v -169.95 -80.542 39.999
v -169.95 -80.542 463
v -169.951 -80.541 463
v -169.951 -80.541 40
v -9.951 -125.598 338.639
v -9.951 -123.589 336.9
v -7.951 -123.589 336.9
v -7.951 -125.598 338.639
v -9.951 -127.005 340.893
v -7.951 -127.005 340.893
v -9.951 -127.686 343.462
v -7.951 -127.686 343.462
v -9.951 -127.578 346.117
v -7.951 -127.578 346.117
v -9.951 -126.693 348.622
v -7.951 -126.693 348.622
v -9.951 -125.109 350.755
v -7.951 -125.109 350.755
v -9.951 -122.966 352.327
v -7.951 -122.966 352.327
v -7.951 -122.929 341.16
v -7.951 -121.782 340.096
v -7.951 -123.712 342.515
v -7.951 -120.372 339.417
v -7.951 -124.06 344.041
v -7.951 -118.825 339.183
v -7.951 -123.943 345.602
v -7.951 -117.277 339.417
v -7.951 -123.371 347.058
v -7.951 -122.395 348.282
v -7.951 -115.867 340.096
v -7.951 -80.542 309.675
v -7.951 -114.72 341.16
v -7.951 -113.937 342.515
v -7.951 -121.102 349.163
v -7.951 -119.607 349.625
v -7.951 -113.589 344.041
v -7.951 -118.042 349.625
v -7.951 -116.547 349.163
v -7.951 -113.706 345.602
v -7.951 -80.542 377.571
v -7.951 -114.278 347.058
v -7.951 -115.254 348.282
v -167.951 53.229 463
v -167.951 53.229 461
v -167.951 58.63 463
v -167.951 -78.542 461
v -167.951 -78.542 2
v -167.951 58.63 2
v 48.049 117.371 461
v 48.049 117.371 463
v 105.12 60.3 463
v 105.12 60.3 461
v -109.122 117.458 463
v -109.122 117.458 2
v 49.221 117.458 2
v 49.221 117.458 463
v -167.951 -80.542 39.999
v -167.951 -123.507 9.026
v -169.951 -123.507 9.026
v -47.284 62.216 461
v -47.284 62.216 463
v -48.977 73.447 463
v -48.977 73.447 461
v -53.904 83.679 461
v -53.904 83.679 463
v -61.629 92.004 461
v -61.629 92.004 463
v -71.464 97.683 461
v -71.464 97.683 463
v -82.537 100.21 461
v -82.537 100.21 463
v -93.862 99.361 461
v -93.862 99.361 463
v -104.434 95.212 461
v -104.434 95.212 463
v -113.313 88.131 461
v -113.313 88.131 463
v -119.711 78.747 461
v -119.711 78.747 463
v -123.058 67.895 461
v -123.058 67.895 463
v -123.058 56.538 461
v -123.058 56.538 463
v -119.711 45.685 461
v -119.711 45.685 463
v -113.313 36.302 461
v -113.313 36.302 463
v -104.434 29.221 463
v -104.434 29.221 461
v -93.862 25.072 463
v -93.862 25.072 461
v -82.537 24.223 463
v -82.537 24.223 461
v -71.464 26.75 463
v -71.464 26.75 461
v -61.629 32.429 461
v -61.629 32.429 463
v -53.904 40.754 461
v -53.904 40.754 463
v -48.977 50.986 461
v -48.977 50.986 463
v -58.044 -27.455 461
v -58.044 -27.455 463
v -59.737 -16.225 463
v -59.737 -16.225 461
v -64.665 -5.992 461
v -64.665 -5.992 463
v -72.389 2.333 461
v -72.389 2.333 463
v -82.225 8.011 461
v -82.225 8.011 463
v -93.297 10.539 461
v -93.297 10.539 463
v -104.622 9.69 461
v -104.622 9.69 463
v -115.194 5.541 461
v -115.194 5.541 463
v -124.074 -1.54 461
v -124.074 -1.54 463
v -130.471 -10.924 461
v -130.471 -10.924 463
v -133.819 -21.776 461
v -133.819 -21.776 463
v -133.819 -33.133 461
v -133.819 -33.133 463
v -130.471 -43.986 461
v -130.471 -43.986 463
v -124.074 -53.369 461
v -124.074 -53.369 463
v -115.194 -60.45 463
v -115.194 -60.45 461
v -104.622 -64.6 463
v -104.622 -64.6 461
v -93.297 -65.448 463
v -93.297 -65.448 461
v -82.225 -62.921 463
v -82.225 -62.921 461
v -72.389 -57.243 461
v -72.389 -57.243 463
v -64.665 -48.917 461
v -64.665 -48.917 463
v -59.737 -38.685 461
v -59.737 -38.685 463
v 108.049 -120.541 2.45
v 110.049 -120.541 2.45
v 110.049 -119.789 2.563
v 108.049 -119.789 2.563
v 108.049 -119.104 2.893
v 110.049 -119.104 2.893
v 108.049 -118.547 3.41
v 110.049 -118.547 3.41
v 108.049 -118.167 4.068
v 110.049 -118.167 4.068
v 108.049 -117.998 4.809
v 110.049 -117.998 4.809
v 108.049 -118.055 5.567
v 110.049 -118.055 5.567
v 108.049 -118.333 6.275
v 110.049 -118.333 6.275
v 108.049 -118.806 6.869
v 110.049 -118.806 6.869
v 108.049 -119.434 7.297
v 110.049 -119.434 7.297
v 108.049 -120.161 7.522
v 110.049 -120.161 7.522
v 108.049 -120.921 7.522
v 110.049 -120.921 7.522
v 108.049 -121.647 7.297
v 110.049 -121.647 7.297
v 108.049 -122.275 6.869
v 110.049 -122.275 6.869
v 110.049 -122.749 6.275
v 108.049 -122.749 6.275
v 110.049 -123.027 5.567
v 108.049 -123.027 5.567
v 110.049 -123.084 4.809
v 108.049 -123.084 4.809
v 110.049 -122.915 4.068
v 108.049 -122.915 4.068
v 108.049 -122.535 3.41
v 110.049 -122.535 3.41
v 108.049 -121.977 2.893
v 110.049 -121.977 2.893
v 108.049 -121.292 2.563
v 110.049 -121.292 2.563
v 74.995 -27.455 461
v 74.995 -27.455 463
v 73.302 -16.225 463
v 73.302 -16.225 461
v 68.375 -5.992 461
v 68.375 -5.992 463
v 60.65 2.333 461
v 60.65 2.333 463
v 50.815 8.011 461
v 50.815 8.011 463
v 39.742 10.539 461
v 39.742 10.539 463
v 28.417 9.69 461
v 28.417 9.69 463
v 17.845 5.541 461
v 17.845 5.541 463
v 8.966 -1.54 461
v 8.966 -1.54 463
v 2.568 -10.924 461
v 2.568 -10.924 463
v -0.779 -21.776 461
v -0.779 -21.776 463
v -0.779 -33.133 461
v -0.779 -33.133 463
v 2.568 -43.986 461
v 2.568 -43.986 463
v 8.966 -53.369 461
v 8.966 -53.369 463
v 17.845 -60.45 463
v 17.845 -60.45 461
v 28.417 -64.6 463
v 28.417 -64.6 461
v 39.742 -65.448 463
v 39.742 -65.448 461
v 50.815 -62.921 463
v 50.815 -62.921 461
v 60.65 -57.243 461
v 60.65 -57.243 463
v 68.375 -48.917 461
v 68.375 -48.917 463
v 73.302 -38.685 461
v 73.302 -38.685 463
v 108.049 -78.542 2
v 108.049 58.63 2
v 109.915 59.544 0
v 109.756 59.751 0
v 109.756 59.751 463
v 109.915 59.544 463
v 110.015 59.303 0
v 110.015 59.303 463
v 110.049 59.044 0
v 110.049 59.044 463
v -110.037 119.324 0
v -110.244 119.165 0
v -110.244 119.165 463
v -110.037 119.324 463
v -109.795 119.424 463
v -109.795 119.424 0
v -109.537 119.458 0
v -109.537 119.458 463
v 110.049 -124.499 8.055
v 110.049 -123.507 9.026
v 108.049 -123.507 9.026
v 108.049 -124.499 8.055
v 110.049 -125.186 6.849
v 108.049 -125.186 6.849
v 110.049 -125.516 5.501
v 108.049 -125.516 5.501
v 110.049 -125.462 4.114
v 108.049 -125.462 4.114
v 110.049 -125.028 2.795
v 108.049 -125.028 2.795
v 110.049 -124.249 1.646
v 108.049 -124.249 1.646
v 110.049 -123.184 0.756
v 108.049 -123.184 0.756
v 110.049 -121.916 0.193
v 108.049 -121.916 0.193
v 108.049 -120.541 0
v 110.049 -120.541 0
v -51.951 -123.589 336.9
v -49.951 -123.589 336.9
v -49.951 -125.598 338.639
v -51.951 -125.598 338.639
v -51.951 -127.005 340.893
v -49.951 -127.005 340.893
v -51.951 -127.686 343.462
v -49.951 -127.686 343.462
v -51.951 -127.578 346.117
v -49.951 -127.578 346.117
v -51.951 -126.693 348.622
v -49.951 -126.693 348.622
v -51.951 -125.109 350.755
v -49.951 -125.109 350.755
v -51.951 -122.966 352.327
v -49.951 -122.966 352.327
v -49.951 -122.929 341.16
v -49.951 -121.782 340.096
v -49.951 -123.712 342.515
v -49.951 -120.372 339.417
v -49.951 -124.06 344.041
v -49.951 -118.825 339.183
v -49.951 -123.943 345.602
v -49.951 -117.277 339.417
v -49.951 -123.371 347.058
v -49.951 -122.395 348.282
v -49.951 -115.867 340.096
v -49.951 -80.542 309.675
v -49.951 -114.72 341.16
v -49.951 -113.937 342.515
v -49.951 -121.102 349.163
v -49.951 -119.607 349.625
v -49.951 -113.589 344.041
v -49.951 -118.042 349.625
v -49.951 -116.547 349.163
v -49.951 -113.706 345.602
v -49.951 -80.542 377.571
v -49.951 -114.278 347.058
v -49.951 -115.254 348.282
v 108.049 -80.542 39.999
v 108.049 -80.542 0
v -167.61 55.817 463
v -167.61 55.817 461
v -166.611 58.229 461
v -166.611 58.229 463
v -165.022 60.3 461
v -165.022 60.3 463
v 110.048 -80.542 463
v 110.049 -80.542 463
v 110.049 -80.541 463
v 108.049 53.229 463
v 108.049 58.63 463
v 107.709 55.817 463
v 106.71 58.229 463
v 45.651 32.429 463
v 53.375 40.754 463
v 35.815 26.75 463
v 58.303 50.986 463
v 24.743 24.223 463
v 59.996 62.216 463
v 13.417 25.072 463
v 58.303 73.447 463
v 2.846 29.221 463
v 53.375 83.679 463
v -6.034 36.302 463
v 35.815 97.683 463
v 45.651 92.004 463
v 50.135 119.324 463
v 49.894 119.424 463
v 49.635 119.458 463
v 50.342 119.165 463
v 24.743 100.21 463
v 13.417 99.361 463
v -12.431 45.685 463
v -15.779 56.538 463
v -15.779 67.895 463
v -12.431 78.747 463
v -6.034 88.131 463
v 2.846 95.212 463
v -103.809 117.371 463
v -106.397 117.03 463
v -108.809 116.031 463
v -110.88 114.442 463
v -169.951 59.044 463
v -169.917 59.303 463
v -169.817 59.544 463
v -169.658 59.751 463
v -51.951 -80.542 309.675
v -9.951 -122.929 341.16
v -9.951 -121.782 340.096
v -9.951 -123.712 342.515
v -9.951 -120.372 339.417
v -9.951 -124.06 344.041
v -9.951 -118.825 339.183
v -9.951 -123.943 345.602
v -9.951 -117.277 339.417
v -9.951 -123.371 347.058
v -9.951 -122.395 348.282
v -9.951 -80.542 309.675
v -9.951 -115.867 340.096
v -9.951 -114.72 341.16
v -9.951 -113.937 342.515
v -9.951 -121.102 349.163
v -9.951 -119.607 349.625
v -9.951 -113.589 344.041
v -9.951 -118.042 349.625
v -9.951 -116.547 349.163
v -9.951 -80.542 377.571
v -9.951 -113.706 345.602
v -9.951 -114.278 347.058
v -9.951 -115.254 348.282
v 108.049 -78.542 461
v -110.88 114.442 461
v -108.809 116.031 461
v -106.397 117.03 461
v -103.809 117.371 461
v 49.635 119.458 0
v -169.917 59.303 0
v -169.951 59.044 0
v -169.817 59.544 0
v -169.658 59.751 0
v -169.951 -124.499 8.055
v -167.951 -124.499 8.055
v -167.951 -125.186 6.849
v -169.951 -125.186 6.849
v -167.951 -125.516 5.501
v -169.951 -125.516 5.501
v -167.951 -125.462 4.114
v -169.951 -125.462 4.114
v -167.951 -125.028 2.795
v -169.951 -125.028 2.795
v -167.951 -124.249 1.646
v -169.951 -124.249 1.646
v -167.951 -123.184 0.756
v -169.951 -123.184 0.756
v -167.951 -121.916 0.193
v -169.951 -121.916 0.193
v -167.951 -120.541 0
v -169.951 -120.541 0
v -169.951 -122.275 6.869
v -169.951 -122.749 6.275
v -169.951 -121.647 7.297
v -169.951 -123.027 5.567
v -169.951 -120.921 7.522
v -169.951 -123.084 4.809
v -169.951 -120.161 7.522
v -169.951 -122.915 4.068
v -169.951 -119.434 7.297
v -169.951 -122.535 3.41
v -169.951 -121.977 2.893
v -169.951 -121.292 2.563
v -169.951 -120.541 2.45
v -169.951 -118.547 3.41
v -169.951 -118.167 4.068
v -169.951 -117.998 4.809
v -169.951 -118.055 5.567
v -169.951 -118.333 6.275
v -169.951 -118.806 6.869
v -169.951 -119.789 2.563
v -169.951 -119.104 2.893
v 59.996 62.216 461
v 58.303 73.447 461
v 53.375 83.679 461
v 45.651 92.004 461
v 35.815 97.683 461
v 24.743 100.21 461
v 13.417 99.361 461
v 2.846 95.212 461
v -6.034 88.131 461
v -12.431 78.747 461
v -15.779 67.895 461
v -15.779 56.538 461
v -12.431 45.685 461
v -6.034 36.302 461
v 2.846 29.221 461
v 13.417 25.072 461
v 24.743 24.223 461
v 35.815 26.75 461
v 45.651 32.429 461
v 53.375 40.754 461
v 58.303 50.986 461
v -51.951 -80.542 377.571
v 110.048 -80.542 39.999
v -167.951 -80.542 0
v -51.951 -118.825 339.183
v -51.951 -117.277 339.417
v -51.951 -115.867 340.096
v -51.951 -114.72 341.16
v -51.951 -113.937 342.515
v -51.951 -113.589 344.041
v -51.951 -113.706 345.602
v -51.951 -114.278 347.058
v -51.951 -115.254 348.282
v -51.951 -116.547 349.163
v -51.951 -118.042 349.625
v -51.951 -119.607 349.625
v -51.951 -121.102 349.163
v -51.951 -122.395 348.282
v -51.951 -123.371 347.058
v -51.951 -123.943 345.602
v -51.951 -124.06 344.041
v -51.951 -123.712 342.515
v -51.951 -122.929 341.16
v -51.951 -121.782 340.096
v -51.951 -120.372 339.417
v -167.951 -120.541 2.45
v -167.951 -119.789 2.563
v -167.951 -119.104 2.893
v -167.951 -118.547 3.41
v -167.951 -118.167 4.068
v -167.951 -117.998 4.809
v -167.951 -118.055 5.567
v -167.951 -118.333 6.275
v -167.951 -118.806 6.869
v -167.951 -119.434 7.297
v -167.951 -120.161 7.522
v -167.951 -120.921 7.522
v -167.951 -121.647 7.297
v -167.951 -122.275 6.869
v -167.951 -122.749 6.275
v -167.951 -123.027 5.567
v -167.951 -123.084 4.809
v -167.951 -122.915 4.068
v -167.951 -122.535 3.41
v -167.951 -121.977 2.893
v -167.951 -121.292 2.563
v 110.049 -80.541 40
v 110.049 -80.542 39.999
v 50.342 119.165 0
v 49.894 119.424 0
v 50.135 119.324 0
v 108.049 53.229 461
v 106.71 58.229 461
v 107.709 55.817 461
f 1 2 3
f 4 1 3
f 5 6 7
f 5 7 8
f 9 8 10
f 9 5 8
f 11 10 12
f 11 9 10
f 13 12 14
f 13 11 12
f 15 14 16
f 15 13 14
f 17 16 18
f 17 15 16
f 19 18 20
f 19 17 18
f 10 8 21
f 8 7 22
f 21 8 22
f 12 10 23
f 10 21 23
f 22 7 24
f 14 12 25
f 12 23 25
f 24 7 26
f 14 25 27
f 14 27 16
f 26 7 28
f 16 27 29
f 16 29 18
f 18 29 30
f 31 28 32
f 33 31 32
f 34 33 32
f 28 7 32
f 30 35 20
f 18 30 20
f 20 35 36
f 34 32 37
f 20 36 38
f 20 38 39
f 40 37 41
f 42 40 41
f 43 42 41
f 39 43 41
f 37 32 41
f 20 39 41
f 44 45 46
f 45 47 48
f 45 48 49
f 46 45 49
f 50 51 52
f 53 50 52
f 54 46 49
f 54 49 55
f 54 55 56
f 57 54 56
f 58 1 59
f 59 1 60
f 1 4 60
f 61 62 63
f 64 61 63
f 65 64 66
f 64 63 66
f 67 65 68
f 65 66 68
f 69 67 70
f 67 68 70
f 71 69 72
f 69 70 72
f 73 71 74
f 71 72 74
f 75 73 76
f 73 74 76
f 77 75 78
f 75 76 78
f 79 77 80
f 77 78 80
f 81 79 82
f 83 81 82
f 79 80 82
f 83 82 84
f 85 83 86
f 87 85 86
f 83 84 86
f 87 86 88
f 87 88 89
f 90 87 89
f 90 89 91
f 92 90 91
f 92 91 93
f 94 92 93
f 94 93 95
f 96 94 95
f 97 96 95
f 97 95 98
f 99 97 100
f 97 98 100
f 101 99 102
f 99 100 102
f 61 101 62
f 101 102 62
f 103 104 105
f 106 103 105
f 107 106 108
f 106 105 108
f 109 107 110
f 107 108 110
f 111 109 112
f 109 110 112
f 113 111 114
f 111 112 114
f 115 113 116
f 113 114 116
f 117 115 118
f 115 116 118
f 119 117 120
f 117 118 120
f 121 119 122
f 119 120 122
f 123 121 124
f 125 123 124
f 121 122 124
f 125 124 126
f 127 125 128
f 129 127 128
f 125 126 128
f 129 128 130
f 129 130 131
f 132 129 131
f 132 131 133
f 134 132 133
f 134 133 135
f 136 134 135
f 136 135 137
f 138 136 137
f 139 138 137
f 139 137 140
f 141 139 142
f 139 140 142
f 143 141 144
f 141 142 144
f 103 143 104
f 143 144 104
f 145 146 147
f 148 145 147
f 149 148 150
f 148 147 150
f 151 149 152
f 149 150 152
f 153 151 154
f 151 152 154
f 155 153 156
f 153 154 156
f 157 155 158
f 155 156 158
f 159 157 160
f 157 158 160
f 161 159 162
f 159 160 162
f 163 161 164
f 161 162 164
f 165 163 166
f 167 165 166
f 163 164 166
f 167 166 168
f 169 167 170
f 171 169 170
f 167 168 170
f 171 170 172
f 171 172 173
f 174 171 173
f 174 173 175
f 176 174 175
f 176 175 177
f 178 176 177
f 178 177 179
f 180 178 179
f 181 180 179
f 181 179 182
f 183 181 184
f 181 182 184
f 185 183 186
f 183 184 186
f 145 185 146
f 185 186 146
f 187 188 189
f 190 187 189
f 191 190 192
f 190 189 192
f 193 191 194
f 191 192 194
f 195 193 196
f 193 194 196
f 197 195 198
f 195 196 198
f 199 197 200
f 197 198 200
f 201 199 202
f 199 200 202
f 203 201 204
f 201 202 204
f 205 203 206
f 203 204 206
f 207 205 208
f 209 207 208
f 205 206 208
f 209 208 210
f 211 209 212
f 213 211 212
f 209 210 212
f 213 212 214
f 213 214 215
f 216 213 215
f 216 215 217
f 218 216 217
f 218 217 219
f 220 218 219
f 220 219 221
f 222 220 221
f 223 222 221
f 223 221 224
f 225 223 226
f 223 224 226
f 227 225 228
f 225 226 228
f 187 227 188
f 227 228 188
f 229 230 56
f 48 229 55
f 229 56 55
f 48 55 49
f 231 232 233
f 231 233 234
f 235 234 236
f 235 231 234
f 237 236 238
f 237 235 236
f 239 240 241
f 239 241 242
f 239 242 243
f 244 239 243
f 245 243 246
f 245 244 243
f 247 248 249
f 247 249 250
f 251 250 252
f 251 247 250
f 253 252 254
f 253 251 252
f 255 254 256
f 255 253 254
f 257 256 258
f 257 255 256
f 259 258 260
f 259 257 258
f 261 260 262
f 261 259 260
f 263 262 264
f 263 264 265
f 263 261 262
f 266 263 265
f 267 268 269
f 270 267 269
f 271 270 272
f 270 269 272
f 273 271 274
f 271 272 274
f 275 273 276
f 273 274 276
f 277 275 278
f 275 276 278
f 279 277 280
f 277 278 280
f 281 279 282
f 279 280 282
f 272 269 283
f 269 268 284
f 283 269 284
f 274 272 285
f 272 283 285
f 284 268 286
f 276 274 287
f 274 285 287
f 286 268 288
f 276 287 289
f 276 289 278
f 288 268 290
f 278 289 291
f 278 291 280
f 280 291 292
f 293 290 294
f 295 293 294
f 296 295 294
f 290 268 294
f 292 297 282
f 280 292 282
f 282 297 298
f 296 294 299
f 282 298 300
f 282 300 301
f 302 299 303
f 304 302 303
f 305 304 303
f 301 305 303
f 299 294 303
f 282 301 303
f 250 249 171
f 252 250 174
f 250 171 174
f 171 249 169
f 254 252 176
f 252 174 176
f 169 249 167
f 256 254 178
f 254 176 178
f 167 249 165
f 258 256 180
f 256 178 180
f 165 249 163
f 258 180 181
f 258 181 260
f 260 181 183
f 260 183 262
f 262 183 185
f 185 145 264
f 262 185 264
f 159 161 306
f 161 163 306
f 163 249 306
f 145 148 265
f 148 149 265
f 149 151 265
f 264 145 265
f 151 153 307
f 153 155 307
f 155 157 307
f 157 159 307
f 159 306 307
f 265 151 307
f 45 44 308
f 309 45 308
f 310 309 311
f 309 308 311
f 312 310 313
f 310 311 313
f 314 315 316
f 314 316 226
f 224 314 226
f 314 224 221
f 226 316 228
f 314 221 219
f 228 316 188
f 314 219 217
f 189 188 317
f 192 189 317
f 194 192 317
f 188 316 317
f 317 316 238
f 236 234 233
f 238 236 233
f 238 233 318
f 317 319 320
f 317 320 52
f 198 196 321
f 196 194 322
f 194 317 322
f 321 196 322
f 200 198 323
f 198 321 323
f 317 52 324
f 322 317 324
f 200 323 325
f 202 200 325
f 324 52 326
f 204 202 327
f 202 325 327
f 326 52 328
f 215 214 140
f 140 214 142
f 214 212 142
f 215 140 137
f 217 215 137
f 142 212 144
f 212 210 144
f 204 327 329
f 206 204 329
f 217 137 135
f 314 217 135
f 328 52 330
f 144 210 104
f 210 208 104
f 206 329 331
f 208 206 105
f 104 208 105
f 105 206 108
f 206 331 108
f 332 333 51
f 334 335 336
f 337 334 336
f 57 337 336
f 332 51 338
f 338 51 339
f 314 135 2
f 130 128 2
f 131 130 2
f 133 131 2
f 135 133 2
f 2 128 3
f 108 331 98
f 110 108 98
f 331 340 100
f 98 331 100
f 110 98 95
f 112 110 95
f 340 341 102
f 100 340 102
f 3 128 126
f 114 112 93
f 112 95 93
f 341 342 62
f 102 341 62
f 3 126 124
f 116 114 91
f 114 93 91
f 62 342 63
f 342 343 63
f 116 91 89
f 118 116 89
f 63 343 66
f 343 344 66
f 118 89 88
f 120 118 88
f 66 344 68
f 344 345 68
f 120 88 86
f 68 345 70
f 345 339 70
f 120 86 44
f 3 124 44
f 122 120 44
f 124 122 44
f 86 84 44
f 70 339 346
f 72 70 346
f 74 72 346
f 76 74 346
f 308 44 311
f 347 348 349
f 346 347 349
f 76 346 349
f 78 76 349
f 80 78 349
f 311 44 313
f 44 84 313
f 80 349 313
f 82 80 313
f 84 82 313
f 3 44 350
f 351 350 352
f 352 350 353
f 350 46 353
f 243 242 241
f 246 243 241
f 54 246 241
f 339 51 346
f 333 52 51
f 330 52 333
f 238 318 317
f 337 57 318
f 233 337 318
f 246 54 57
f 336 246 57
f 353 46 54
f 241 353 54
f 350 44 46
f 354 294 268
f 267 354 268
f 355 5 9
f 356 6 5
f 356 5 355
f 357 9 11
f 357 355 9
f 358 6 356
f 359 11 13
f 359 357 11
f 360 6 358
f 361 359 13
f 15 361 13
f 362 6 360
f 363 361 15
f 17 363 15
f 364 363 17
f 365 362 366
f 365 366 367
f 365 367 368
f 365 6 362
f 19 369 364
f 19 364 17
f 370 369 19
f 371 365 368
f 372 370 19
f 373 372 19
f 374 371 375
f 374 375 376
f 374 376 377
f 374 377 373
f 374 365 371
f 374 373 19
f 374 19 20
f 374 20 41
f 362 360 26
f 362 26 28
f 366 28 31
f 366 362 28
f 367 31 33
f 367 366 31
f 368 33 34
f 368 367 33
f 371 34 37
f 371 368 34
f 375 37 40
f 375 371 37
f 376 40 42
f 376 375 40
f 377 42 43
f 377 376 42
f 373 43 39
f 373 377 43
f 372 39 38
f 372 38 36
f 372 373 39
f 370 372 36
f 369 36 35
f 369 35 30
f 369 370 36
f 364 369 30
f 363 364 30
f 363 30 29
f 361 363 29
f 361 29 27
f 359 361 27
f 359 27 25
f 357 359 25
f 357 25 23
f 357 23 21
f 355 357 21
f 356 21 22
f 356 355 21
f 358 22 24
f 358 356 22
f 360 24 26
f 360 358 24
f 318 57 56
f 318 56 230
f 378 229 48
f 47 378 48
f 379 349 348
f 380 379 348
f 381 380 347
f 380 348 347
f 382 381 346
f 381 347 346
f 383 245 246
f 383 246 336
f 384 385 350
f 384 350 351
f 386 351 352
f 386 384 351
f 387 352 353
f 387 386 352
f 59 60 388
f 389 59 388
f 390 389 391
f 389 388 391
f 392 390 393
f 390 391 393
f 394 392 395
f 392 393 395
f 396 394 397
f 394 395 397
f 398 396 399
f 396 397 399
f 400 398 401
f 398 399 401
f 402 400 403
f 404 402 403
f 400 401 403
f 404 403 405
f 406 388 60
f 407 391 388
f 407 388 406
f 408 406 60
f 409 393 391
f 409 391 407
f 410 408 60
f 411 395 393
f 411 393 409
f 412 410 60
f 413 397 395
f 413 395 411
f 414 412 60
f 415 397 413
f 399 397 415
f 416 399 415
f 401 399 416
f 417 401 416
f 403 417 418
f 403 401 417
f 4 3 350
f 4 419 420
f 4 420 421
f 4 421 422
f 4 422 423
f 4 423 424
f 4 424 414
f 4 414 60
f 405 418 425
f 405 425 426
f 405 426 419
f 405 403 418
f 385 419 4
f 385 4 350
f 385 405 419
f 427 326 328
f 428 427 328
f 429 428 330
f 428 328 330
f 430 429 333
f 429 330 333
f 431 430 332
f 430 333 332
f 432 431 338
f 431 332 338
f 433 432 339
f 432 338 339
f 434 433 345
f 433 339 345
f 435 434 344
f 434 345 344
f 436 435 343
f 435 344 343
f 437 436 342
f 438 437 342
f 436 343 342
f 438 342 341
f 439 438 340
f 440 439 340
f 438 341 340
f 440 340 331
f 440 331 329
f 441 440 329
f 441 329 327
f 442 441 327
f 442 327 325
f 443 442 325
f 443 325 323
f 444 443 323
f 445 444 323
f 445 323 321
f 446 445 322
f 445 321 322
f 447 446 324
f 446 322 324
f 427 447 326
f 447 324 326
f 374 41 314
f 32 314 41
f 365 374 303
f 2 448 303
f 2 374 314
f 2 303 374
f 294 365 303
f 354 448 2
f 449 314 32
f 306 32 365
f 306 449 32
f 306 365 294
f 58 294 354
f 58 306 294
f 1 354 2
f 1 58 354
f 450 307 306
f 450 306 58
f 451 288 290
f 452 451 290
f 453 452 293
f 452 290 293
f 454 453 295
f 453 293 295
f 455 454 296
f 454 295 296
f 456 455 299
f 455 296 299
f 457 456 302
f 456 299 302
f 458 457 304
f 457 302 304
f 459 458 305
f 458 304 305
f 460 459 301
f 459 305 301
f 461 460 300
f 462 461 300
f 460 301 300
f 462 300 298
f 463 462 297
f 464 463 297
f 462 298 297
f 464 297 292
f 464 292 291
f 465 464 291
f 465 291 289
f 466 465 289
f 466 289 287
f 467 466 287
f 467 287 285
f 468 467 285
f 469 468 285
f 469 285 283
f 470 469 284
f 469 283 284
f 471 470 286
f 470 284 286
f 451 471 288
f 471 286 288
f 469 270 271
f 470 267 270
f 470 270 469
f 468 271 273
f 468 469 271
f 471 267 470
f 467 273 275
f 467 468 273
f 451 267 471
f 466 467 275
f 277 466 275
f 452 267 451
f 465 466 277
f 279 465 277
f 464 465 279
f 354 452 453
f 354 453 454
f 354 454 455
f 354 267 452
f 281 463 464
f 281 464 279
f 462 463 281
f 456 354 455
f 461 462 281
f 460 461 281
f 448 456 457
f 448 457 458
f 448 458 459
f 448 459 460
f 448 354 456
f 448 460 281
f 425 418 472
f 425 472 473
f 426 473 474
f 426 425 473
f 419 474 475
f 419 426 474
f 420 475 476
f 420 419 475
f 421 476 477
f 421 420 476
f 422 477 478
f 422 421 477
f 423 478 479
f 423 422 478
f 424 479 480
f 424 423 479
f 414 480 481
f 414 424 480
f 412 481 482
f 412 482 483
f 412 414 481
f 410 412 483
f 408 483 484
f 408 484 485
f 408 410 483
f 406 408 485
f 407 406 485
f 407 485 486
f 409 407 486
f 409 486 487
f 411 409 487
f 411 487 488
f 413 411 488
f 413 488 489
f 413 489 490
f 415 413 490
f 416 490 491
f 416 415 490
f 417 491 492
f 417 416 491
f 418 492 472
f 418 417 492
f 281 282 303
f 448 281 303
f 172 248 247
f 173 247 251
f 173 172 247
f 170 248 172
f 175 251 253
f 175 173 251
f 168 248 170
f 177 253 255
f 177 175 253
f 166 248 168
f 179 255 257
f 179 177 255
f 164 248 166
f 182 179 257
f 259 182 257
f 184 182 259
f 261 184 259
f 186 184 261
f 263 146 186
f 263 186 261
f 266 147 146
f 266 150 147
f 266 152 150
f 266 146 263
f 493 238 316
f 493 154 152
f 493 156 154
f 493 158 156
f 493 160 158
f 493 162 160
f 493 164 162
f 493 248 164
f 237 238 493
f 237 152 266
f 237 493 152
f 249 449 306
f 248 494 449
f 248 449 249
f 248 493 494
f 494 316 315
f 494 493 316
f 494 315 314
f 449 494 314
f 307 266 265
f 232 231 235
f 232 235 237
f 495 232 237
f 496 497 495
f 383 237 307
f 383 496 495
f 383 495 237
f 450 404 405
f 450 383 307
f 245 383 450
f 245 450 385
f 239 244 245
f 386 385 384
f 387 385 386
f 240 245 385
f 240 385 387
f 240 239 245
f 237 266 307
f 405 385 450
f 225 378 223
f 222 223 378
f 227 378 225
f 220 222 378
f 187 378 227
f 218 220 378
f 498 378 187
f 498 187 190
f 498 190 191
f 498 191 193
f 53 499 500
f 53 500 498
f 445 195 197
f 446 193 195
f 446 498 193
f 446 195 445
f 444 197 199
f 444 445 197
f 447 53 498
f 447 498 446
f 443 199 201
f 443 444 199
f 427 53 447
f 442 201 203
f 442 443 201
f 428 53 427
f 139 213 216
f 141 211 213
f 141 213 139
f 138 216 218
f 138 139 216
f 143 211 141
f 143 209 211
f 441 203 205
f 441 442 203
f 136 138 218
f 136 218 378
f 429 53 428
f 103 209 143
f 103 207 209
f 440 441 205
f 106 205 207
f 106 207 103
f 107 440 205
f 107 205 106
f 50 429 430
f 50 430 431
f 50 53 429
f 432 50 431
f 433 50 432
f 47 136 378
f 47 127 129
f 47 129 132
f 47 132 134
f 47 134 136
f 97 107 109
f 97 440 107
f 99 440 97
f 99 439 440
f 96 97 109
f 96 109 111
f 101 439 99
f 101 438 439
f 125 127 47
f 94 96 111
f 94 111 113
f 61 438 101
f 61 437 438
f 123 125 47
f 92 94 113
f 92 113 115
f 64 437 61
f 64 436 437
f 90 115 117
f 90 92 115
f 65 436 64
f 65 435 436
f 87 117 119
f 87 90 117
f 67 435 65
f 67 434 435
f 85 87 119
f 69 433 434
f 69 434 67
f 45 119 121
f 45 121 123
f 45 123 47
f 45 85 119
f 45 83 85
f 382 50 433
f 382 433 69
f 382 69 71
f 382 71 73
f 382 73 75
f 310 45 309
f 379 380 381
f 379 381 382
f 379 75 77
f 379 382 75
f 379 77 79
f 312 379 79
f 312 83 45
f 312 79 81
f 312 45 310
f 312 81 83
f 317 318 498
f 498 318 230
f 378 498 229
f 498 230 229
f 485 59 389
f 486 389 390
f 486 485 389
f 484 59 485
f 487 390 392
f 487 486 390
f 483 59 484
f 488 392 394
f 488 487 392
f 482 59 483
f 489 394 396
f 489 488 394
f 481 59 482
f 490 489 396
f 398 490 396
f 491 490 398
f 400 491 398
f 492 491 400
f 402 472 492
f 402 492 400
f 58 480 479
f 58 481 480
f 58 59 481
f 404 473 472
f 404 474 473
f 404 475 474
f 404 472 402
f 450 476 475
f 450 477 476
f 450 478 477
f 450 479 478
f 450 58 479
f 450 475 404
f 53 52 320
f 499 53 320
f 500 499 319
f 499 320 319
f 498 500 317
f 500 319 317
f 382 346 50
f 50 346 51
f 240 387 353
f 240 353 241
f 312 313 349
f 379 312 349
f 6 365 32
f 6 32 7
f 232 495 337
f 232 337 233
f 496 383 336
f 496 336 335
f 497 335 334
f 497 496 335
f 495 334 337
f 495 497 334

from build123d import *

# Parameters (mm, degrees)
BOSS_EXTRUDE1_DEPTH = 463
SHELL2_T            = -2
SKETCH2_R           = 2.55
BOSS_EXTRUDE2_DEPTH = 2
SKETCH4_R           = 5.25
BOSS_EXTRUDE3_DEPTH = 2
BOSS_EXTRUDE4_DEPTH = 2
SKETCH6_R           = 38.1
CUT_EXTRUDE1_DEPTH  = 2


with BuildPart() as part:
    # Sketch1 → Boss-Extrude1 (new body)
    with BuildSketch(Plane.XY):
        with BuildLine():
            Line((-169.657845697, 59.751021298), (-110.243632135, 119.16523486))
            ThreePointArc((-110.243632135, 119.16523486), (-109.919208786, 119.382007611), (-109.536525354, 119.458128079))
            Line((-109.536525354, 119.458128079), (49.635047521, 119.458128079))
            ThreePointArc((49.635047521, 119.458128079), (50.017730954, 119.382007611), (50.342154303, 119.16523486))
            Line((50.342154303, 119.16523486), (109.756367865, 59.751021298))
            ThreePointArc((109.756367865, 59.751021298), (109.973140616, 59.426597949), (110.049261084, 59.043914516))
            Line((110.049261084, 59.043914516), (110.049261084, -80.540871921))
            ThreePointArc((110.049261084, -80.540871921), (110.048968191, -80.541579028), (110.048261084, -80.541871921))
            Line((110.048261084, -80.541871921), (-169.949738916, -80.541871921))
            ThreePointArc((-169.949738916, -80.541871921), (-169.950446023, -80.541579028), (-169.950738916, -80.540871921))
            Line((-169.950738916, -80.540871921), (-169.950738916, 59.043914516))
            ThreePointArc((-169.950738916, 59.043914516), (-169.874618449, 59.426597949), (-169.657845697, 59.751021298))
        make_face()
    extrude(amount=BOSS_EXTRUDE1_DEPTH)

    # Shell2
    shell2_openings = [part.faces().sort_by_distance(p)[0] for p in [
        (-29.950738916, 32.739133998, 463),
    ]]
    offset(amount=SHELL2_T, openings=shell2_openings, kind=Kind.INTERSECTION)

    # Sketch2 → Boss-Extrude2 (add)
    with BuildSketch(Plane(origin=(110.049261084, 0, 0), x_dir=(0, 0, -1), z_dir=(1, 0, 0))):
        with BuildLine():
            Line((-40, -80.540871921), (-9.025530914, -123.506525452))
            ThreePointArc((-9.025530914, -123.506525452), (-3.439175629, -125.291011633), (0, -120.540871921))
            Line((0, -120.540871921), (0, -80.540871921))
            Line((0, -80.540871921), (-40, -80.540871921))
        make_face()
        with Locations((-5, -120.540871921)):
            Circle(SKETCH2_R, mode=Mode.SUBTRACT)
    boss_extrude2 = extrude(amount=-BOSS_EXTRUDE2_DEPTH)

    # Mirror1: Boss-Extrude2 across plane
    add(boss_extrude2.mirror(Plane(origin=(-29.950738916, 0, 0), x_dir=(0, 0, 1), z_dir=(1, 0, 0))))

    # Sketch4 → Boss-Extrude3 (add)
    with BuildSketch(Plane(origin=(-49.950738916, 0, 0), x_dir=(0, 0, -1), z_dir=(1, 0, 0))):
        with BuildLine():
            Line((-352.326976552, -122.966309209), (-377.571249485, -80.540871921))
            Line((-377.571249485, -80.540871921), (-309.673952471, -80.540871921))
            Line((-309.673952471, -80.540871921), (-336.899509657, -123.589322478))
            ThreePointArc((-336.899509657, -123.589322478), (-344.793097516, -127.731489821), (-352.326976552, -122.966309209))
        make_face()
        with Locations((-344.43340661, -118.824585544)):
            Circle(SKETCH4_R, mode=Mode.SUBTRACT)
    boss_extrude3 = extrude(amount=-BOSS_EXTRUDE3_DEPTH)

    # Mirror2: Boss-Extrude3 across plane
    add(boss_extrude3.mirror(Plane(origin=(-29.950738916, 0, 0), x_dir=(0, 0, 1), z_dir=(1, 0, 0))))

    # Sketch5 → Boss-Extrude4 (add)
    with BuildSketch(Plane.XY.offset(463)):
        with BuildLine():
            Line((-165.021806728, 60.299996742), (-110.879671104, 114.442132366))
            ThreePointArc((-110.879671104, 114.442132366), (-107.635437616, 116.609859879), (-103.808603293, 117.371064554))
            Line((-103.808603293, 117.371064554), (48.049261084, 117.371064554))
            Line((48.049261084, 117.371064554), (105.120328896, 60.299996742))
            ThreePointArc((105.120328896, 60.299996742), (107.288056409, 57.055763254), (108.049261084, 53.22892893))
            Line((108.049261084, 53.22892893), (108.049261084, -78.541871921))
            Line((108.049261084, -78.541871921), (-167.950738916, -78.541871921))
            Line((-167.950738916, -78.541871921), (-167.950738916, 53.22892893))
            ThreePointArc((-167.950738916, 53.22892893), (-167.189534241, 57.055763254), (-165.021806728, 60.299996742))
        make_face()
    extrude(amount=-BOSS_EXTRUDE4_DEPTH)

    # Sketch6 → Cut-Extrude1 (cut)
    with BuildSketch(Plane.XY.offset(463)):
        with Locations((36.895099285, -27.454834831)):
            Circle(SKETCH6_R)
        with Locations((-96.144422598, -27.454834831)):
            Circle(SKETCH6_R)
        with Locations((-85.383873034, 62.216411536)):
            Circle(SKETCH6_R)
        with Locations((21.895545347, 62.216411536)):
            Circle(SKETCH6_R)
    extrude(amount=-CUT_EXTRUDE1_DEPTH, mode=Mode.SUBTRACT)


solid = part.part
